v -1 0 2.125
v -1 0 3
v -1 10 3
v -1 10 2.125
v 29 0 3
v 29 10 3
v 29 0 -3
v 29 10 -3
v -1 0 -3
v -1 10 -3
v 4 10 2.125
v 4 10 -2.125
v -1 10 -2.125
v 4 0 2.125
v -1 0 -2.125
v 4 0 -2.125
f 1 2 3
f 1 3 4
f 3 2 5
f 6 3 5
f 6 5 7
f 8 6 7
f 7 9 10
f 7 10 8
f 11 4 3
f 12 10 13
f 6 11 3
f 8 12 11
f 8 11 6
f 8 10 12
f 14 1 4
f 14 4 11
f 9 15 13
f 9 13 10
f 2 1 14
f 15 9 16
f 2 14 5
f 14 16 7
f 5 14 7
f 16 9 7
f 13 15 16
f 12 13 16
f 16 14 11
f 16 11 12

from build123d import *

# Parameters (mm, degrees)
SKETCH1_W           = 30
SKETCH1_H           = 6
BOSS_EXTRUDE1_DEPTH = 10
SKETCH1_4_W         = 5
SKETCH1_4_H         = 4.25
CUT_EXTRUDE1_DEPTH  = 31.822070015


with BuildPart() as part:
    # Sketch1 → Boss-Extrude1 (new body)
    with BuildSketch(Plane(origin=(0, 0, 0), x_dir=(1, 0, 0), z_dir=(0, 1, 0))):
        with Locations((14, 0)):
            Rectangle(SKETCH1_W, SKETCH1_H)
    extrude(amount=BOSS_EXTRUDE1_DEPTH)

    # Sketch1<4> → Cut-Extrude1 (cut, through all)
    with BuildSketch(Plane(origin=(0, 0, 0), x_dir=(1, 0, 0), z_dir=(0, 1, 0))):
        with Locations((1.5, 0)):
            Rectangle(SKETCH1_4_W, SKETCH1_4_H)
    extrude(amount=CUT_EXTRUDE1_DEPTH, mode=Mode.SUBTRACT)


solid = part.part
